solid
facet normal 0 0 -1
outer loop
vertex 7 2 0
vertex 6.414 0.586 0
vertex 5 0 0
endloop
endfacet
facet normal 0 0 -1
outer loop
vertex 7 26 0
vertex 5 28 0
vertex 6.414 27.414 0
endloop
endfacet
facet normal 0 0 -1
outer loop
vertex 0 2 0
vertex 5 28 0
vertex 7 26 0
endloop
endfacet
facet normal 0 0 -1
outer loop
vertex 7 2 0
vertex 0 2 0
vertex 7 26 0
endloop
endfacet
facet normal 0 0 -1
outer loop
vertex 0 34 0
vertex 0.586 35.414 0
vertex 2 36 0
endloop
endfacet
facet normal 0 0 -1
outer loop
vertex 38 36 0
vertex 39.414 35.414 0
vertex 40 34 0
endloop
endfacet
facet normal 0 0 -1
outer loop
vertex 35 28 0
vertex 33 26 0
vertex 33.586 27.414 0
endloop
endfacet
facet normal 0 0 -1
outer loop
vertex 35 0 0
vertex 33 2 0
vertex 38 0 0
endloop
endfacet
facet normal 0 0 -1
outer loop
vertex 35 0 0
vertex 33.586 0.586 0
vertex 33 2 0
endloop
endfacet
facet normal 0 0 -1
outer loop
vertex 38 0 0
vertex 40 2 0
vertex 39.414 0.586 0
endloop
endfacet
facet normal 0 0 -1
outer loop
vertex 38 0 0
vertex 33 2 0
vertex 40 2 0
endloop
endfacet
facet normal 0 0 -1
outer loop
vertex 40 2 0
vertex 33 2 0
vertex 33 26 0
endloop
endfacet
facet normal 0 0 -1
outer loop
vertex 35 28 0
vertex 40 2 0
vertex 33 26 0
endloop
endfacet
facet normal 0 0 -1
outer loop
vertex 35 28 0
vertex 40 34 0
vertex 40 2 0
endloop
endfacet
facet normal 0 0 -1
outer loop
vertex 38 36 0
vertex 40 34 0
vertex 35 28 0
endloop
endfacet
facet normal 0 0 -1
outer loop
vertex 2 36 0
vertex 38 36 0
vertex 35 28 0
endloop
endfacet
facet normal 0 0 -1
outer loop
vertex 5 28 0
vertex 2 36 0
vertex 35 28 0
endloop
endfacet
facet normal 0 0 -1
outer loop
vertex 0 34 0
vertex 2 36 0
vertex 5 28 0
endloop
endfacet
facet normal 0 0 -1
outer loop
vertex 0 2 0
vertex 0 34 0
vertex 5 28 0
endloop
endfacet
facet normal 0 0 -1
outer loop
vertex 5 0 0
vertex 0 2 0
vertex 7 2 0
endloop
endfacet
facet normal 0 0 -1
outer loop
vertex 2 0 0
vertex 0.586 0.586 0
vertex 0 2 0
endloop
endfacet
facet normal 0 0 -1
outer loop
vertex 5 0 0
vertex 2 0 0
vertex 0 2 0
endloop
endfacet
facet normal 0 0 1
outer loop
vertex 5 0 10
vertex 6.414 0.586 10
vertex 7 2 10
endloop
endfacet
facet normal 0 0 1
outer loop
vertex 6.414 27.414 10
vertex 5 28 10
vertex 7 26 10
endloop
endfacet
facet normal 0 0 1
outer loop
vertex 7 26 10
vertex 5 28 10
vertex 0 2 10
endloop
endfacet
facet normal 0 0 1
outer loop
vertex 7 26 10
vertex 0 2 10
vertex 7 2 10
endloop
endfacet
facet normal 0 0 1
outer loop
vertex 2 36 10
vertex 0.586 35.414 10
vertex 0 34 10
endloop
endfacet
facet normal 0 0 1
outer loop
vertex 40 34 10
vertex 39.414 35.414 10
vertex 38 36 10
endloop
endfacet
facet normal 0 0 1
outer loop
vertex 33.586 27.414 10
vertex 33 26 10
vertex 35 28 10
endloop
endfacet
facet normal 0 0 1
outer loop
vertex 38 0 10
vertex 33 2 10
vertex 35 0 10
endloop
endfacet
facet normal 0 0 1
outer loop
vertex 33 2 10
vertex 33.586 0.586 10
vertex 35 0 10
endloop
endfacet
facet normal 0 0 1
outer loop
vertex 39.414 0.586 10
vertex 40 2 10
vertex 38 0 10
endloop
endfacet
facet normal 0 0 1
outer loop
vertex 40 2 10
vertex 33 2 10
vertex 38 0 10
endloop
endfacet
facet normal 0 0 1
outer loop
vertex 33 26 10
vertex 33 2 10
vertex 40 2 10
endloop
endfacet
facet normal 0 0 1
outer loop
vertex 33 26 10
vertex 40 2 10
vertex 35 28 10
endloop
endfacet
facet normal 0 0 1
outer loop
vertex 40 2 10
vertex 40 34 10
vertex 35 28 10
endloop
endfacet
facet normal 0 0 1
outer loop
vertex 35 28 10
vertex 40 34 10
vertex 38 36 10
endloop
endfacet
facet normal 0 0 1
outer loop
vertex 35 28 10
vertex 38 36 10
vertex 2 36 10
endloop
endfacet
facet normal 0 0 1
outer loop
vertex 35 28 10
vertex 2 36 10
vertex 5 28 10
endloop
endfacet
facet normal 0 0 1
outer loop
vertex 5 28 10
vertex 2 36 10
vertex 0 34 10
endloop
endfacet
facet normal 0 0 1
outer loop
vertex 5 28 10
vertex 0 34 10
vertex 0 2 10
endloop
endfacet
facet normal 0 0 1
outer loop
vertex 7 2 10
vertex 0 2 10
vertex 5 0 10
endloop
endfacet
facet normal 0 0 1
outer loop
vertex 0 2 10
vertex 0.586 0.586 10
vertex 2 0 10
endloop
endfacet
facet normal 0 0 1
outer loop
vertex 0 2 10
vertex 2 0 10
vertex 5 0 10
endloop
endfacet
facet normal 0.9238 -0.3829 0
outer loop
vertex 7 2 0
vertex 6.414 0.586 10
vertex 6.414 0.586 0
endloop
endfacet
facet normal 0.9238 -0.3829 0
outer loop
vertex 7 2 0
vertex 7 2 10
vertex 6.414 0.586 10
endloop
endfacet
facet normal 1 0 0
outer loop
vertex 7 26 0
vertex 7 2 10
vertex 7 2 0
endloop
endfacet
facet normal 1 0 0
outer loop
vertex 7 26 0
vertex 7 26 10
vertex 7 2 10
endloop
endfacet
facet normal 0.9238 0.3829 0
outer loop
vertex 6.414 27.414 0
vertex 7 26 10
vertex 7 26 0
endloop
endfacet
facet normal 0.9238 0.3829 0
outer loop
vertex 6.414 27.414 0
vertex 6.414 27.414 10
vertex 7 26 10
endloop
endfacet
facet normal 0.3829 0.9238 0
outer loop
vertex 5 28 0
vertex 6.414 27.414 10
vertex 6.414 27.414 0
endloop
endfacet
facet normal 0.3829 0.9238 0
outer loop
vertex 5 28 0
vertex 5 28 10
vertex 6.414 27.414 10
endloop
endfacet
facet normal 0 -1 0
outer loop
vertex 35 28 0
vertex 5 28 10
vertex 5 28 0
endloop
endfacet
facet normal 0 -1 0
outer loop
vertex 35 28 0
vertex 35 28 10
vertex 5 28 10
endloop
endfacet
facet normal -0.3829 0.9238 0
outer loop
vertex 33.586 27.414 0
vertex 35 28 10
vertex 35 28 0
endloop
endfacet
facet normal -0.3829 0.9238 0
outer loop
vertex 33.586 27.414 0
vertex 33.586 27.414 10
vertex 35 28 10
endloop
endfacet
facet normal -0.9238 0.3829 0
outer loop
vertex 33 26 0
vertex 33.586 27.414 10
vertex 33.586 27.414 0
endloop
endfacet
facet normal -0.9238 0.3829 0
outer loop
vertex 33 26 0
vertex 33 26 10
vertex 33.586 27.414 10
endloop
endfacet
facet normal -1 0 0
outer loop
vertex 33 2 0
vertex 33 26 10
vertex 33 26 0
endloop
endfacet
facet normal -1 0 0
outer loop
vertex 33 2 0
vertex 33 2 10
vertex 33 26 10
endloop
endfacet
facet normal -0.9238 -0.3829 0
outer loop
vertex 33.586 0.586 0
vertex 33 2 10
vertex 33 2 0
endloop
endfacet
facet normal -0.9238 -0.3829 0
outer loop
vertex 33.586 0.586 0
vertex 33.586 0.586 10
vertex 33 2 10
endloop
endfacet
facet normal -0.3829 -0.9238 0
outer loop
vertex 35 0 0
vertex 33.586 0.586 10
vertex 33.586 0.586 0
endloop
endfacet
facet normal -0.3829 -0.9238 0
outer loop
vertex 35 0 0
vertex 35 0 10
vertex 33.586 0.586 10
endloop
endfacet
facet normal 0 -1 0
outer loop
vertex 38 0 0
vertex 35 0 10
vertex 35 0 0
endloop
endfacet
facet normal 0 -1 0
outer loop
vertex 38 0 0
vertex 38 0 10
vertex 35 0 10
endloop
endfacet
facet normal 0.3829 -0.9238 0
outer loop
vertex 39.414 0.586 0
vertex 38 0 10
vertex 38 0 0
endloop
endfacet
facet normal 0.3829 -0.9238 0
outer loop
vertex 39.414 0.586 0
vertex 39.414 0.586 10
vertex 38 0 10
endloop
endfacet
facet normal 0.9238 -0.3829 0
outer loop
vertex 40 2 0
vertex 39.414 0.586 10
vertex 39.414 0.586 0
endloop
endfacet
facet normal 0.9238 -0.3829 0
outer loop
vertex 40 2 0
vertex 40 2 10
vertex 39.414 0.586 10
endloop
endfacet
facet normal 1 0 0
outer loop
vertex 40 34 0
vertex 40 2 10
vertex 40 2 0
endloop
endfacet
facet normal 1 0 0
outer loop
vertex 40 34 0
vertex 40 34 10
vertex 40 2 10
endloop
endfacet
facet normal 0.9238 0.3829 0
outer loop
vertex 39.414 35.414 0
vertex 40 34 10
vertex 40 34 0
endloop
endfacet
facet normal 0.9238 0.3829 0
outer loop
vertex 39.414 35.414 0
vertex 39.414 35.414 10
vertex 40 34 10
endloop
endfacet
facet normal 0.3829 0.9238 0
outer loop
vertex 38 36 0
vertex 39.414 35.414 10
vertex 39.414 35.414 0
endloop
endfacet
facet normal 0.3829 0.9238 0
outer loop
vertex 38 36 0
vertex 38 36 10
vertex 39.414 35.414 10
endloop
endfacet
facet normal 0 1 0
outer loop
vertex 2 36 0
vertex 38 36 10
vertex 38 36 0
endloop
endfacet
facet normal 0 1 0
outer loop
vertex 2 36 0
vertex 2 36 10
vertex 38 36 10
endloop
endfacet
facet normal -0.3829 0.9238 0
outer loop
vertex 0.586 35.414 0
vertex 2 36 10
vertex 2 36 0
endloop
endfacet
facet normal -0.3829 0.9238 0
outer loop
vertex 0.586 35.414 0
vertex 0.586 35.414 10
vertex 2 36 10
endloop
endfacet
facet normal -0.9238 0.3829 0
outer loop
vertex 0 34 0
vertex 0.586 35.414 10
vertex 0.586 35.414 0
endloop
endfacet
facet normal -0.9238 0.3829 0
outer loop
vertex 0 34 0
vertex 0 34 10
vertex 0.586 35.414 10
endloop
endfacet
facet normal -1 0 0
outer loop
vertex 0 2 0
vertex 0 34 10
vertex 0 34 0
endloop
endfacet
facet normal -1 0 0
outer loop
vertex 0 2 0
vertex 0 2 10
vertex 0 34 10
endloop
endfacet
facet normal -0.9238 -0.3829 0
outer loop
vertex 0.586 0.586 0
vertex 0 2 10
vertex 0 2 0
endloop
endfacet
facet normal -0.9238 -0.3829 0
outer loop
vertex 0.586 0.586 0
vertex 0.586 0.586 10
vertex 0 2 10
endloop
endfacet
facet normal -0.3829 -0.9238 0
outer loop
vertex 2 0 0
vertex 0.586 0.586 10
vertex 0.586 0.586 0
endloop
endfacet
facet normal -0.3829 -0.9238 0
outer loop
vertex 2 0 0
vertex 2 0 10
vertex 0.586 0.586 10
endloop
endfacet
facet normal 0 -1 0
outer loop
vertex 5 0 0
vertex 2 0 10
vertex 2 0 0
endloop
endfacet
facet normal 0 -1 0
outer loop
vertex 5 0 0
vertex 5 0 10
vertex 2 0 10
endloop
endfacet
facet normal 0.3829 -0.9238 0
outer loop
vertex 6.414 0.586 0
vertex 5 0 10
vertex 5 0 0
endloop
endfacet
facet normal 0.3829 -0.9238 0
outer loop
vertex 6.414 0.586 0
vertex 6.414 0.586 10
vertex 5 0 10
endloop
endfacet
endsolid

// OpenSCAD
$fn = 32;

// ----------------------------------------------------------------------
// Clip blank: staple clip, 10 mm thick
// ----------------------------------------------------------------------

// --- parameters (mm) ---
profile_height = 10;      // extrusion height
profile_points = 24;      // points of the closed outline

profile = [[0, 2], [0.586, 0.586], [2, 0], [5, 0], [6.414, 0.586], [7, 2], [7, 26], [6.414, 27.414], [5, 28], [35, 28], [33.586, 27.414], [33, 26], [33, 2], [33.586, 0.586], [35, 0], [38, 0], [39.414, 0.586], [40, 2], [40, 34], [39.414, 35.414], [38, 36], [2, 36], [0.586, 35.414], [0, 34]];  // single closed polygon, 24 points, counter clockwise

// --- the one profile operation ---
linear_extrude(height = profile_height) polygon(points = profile);
